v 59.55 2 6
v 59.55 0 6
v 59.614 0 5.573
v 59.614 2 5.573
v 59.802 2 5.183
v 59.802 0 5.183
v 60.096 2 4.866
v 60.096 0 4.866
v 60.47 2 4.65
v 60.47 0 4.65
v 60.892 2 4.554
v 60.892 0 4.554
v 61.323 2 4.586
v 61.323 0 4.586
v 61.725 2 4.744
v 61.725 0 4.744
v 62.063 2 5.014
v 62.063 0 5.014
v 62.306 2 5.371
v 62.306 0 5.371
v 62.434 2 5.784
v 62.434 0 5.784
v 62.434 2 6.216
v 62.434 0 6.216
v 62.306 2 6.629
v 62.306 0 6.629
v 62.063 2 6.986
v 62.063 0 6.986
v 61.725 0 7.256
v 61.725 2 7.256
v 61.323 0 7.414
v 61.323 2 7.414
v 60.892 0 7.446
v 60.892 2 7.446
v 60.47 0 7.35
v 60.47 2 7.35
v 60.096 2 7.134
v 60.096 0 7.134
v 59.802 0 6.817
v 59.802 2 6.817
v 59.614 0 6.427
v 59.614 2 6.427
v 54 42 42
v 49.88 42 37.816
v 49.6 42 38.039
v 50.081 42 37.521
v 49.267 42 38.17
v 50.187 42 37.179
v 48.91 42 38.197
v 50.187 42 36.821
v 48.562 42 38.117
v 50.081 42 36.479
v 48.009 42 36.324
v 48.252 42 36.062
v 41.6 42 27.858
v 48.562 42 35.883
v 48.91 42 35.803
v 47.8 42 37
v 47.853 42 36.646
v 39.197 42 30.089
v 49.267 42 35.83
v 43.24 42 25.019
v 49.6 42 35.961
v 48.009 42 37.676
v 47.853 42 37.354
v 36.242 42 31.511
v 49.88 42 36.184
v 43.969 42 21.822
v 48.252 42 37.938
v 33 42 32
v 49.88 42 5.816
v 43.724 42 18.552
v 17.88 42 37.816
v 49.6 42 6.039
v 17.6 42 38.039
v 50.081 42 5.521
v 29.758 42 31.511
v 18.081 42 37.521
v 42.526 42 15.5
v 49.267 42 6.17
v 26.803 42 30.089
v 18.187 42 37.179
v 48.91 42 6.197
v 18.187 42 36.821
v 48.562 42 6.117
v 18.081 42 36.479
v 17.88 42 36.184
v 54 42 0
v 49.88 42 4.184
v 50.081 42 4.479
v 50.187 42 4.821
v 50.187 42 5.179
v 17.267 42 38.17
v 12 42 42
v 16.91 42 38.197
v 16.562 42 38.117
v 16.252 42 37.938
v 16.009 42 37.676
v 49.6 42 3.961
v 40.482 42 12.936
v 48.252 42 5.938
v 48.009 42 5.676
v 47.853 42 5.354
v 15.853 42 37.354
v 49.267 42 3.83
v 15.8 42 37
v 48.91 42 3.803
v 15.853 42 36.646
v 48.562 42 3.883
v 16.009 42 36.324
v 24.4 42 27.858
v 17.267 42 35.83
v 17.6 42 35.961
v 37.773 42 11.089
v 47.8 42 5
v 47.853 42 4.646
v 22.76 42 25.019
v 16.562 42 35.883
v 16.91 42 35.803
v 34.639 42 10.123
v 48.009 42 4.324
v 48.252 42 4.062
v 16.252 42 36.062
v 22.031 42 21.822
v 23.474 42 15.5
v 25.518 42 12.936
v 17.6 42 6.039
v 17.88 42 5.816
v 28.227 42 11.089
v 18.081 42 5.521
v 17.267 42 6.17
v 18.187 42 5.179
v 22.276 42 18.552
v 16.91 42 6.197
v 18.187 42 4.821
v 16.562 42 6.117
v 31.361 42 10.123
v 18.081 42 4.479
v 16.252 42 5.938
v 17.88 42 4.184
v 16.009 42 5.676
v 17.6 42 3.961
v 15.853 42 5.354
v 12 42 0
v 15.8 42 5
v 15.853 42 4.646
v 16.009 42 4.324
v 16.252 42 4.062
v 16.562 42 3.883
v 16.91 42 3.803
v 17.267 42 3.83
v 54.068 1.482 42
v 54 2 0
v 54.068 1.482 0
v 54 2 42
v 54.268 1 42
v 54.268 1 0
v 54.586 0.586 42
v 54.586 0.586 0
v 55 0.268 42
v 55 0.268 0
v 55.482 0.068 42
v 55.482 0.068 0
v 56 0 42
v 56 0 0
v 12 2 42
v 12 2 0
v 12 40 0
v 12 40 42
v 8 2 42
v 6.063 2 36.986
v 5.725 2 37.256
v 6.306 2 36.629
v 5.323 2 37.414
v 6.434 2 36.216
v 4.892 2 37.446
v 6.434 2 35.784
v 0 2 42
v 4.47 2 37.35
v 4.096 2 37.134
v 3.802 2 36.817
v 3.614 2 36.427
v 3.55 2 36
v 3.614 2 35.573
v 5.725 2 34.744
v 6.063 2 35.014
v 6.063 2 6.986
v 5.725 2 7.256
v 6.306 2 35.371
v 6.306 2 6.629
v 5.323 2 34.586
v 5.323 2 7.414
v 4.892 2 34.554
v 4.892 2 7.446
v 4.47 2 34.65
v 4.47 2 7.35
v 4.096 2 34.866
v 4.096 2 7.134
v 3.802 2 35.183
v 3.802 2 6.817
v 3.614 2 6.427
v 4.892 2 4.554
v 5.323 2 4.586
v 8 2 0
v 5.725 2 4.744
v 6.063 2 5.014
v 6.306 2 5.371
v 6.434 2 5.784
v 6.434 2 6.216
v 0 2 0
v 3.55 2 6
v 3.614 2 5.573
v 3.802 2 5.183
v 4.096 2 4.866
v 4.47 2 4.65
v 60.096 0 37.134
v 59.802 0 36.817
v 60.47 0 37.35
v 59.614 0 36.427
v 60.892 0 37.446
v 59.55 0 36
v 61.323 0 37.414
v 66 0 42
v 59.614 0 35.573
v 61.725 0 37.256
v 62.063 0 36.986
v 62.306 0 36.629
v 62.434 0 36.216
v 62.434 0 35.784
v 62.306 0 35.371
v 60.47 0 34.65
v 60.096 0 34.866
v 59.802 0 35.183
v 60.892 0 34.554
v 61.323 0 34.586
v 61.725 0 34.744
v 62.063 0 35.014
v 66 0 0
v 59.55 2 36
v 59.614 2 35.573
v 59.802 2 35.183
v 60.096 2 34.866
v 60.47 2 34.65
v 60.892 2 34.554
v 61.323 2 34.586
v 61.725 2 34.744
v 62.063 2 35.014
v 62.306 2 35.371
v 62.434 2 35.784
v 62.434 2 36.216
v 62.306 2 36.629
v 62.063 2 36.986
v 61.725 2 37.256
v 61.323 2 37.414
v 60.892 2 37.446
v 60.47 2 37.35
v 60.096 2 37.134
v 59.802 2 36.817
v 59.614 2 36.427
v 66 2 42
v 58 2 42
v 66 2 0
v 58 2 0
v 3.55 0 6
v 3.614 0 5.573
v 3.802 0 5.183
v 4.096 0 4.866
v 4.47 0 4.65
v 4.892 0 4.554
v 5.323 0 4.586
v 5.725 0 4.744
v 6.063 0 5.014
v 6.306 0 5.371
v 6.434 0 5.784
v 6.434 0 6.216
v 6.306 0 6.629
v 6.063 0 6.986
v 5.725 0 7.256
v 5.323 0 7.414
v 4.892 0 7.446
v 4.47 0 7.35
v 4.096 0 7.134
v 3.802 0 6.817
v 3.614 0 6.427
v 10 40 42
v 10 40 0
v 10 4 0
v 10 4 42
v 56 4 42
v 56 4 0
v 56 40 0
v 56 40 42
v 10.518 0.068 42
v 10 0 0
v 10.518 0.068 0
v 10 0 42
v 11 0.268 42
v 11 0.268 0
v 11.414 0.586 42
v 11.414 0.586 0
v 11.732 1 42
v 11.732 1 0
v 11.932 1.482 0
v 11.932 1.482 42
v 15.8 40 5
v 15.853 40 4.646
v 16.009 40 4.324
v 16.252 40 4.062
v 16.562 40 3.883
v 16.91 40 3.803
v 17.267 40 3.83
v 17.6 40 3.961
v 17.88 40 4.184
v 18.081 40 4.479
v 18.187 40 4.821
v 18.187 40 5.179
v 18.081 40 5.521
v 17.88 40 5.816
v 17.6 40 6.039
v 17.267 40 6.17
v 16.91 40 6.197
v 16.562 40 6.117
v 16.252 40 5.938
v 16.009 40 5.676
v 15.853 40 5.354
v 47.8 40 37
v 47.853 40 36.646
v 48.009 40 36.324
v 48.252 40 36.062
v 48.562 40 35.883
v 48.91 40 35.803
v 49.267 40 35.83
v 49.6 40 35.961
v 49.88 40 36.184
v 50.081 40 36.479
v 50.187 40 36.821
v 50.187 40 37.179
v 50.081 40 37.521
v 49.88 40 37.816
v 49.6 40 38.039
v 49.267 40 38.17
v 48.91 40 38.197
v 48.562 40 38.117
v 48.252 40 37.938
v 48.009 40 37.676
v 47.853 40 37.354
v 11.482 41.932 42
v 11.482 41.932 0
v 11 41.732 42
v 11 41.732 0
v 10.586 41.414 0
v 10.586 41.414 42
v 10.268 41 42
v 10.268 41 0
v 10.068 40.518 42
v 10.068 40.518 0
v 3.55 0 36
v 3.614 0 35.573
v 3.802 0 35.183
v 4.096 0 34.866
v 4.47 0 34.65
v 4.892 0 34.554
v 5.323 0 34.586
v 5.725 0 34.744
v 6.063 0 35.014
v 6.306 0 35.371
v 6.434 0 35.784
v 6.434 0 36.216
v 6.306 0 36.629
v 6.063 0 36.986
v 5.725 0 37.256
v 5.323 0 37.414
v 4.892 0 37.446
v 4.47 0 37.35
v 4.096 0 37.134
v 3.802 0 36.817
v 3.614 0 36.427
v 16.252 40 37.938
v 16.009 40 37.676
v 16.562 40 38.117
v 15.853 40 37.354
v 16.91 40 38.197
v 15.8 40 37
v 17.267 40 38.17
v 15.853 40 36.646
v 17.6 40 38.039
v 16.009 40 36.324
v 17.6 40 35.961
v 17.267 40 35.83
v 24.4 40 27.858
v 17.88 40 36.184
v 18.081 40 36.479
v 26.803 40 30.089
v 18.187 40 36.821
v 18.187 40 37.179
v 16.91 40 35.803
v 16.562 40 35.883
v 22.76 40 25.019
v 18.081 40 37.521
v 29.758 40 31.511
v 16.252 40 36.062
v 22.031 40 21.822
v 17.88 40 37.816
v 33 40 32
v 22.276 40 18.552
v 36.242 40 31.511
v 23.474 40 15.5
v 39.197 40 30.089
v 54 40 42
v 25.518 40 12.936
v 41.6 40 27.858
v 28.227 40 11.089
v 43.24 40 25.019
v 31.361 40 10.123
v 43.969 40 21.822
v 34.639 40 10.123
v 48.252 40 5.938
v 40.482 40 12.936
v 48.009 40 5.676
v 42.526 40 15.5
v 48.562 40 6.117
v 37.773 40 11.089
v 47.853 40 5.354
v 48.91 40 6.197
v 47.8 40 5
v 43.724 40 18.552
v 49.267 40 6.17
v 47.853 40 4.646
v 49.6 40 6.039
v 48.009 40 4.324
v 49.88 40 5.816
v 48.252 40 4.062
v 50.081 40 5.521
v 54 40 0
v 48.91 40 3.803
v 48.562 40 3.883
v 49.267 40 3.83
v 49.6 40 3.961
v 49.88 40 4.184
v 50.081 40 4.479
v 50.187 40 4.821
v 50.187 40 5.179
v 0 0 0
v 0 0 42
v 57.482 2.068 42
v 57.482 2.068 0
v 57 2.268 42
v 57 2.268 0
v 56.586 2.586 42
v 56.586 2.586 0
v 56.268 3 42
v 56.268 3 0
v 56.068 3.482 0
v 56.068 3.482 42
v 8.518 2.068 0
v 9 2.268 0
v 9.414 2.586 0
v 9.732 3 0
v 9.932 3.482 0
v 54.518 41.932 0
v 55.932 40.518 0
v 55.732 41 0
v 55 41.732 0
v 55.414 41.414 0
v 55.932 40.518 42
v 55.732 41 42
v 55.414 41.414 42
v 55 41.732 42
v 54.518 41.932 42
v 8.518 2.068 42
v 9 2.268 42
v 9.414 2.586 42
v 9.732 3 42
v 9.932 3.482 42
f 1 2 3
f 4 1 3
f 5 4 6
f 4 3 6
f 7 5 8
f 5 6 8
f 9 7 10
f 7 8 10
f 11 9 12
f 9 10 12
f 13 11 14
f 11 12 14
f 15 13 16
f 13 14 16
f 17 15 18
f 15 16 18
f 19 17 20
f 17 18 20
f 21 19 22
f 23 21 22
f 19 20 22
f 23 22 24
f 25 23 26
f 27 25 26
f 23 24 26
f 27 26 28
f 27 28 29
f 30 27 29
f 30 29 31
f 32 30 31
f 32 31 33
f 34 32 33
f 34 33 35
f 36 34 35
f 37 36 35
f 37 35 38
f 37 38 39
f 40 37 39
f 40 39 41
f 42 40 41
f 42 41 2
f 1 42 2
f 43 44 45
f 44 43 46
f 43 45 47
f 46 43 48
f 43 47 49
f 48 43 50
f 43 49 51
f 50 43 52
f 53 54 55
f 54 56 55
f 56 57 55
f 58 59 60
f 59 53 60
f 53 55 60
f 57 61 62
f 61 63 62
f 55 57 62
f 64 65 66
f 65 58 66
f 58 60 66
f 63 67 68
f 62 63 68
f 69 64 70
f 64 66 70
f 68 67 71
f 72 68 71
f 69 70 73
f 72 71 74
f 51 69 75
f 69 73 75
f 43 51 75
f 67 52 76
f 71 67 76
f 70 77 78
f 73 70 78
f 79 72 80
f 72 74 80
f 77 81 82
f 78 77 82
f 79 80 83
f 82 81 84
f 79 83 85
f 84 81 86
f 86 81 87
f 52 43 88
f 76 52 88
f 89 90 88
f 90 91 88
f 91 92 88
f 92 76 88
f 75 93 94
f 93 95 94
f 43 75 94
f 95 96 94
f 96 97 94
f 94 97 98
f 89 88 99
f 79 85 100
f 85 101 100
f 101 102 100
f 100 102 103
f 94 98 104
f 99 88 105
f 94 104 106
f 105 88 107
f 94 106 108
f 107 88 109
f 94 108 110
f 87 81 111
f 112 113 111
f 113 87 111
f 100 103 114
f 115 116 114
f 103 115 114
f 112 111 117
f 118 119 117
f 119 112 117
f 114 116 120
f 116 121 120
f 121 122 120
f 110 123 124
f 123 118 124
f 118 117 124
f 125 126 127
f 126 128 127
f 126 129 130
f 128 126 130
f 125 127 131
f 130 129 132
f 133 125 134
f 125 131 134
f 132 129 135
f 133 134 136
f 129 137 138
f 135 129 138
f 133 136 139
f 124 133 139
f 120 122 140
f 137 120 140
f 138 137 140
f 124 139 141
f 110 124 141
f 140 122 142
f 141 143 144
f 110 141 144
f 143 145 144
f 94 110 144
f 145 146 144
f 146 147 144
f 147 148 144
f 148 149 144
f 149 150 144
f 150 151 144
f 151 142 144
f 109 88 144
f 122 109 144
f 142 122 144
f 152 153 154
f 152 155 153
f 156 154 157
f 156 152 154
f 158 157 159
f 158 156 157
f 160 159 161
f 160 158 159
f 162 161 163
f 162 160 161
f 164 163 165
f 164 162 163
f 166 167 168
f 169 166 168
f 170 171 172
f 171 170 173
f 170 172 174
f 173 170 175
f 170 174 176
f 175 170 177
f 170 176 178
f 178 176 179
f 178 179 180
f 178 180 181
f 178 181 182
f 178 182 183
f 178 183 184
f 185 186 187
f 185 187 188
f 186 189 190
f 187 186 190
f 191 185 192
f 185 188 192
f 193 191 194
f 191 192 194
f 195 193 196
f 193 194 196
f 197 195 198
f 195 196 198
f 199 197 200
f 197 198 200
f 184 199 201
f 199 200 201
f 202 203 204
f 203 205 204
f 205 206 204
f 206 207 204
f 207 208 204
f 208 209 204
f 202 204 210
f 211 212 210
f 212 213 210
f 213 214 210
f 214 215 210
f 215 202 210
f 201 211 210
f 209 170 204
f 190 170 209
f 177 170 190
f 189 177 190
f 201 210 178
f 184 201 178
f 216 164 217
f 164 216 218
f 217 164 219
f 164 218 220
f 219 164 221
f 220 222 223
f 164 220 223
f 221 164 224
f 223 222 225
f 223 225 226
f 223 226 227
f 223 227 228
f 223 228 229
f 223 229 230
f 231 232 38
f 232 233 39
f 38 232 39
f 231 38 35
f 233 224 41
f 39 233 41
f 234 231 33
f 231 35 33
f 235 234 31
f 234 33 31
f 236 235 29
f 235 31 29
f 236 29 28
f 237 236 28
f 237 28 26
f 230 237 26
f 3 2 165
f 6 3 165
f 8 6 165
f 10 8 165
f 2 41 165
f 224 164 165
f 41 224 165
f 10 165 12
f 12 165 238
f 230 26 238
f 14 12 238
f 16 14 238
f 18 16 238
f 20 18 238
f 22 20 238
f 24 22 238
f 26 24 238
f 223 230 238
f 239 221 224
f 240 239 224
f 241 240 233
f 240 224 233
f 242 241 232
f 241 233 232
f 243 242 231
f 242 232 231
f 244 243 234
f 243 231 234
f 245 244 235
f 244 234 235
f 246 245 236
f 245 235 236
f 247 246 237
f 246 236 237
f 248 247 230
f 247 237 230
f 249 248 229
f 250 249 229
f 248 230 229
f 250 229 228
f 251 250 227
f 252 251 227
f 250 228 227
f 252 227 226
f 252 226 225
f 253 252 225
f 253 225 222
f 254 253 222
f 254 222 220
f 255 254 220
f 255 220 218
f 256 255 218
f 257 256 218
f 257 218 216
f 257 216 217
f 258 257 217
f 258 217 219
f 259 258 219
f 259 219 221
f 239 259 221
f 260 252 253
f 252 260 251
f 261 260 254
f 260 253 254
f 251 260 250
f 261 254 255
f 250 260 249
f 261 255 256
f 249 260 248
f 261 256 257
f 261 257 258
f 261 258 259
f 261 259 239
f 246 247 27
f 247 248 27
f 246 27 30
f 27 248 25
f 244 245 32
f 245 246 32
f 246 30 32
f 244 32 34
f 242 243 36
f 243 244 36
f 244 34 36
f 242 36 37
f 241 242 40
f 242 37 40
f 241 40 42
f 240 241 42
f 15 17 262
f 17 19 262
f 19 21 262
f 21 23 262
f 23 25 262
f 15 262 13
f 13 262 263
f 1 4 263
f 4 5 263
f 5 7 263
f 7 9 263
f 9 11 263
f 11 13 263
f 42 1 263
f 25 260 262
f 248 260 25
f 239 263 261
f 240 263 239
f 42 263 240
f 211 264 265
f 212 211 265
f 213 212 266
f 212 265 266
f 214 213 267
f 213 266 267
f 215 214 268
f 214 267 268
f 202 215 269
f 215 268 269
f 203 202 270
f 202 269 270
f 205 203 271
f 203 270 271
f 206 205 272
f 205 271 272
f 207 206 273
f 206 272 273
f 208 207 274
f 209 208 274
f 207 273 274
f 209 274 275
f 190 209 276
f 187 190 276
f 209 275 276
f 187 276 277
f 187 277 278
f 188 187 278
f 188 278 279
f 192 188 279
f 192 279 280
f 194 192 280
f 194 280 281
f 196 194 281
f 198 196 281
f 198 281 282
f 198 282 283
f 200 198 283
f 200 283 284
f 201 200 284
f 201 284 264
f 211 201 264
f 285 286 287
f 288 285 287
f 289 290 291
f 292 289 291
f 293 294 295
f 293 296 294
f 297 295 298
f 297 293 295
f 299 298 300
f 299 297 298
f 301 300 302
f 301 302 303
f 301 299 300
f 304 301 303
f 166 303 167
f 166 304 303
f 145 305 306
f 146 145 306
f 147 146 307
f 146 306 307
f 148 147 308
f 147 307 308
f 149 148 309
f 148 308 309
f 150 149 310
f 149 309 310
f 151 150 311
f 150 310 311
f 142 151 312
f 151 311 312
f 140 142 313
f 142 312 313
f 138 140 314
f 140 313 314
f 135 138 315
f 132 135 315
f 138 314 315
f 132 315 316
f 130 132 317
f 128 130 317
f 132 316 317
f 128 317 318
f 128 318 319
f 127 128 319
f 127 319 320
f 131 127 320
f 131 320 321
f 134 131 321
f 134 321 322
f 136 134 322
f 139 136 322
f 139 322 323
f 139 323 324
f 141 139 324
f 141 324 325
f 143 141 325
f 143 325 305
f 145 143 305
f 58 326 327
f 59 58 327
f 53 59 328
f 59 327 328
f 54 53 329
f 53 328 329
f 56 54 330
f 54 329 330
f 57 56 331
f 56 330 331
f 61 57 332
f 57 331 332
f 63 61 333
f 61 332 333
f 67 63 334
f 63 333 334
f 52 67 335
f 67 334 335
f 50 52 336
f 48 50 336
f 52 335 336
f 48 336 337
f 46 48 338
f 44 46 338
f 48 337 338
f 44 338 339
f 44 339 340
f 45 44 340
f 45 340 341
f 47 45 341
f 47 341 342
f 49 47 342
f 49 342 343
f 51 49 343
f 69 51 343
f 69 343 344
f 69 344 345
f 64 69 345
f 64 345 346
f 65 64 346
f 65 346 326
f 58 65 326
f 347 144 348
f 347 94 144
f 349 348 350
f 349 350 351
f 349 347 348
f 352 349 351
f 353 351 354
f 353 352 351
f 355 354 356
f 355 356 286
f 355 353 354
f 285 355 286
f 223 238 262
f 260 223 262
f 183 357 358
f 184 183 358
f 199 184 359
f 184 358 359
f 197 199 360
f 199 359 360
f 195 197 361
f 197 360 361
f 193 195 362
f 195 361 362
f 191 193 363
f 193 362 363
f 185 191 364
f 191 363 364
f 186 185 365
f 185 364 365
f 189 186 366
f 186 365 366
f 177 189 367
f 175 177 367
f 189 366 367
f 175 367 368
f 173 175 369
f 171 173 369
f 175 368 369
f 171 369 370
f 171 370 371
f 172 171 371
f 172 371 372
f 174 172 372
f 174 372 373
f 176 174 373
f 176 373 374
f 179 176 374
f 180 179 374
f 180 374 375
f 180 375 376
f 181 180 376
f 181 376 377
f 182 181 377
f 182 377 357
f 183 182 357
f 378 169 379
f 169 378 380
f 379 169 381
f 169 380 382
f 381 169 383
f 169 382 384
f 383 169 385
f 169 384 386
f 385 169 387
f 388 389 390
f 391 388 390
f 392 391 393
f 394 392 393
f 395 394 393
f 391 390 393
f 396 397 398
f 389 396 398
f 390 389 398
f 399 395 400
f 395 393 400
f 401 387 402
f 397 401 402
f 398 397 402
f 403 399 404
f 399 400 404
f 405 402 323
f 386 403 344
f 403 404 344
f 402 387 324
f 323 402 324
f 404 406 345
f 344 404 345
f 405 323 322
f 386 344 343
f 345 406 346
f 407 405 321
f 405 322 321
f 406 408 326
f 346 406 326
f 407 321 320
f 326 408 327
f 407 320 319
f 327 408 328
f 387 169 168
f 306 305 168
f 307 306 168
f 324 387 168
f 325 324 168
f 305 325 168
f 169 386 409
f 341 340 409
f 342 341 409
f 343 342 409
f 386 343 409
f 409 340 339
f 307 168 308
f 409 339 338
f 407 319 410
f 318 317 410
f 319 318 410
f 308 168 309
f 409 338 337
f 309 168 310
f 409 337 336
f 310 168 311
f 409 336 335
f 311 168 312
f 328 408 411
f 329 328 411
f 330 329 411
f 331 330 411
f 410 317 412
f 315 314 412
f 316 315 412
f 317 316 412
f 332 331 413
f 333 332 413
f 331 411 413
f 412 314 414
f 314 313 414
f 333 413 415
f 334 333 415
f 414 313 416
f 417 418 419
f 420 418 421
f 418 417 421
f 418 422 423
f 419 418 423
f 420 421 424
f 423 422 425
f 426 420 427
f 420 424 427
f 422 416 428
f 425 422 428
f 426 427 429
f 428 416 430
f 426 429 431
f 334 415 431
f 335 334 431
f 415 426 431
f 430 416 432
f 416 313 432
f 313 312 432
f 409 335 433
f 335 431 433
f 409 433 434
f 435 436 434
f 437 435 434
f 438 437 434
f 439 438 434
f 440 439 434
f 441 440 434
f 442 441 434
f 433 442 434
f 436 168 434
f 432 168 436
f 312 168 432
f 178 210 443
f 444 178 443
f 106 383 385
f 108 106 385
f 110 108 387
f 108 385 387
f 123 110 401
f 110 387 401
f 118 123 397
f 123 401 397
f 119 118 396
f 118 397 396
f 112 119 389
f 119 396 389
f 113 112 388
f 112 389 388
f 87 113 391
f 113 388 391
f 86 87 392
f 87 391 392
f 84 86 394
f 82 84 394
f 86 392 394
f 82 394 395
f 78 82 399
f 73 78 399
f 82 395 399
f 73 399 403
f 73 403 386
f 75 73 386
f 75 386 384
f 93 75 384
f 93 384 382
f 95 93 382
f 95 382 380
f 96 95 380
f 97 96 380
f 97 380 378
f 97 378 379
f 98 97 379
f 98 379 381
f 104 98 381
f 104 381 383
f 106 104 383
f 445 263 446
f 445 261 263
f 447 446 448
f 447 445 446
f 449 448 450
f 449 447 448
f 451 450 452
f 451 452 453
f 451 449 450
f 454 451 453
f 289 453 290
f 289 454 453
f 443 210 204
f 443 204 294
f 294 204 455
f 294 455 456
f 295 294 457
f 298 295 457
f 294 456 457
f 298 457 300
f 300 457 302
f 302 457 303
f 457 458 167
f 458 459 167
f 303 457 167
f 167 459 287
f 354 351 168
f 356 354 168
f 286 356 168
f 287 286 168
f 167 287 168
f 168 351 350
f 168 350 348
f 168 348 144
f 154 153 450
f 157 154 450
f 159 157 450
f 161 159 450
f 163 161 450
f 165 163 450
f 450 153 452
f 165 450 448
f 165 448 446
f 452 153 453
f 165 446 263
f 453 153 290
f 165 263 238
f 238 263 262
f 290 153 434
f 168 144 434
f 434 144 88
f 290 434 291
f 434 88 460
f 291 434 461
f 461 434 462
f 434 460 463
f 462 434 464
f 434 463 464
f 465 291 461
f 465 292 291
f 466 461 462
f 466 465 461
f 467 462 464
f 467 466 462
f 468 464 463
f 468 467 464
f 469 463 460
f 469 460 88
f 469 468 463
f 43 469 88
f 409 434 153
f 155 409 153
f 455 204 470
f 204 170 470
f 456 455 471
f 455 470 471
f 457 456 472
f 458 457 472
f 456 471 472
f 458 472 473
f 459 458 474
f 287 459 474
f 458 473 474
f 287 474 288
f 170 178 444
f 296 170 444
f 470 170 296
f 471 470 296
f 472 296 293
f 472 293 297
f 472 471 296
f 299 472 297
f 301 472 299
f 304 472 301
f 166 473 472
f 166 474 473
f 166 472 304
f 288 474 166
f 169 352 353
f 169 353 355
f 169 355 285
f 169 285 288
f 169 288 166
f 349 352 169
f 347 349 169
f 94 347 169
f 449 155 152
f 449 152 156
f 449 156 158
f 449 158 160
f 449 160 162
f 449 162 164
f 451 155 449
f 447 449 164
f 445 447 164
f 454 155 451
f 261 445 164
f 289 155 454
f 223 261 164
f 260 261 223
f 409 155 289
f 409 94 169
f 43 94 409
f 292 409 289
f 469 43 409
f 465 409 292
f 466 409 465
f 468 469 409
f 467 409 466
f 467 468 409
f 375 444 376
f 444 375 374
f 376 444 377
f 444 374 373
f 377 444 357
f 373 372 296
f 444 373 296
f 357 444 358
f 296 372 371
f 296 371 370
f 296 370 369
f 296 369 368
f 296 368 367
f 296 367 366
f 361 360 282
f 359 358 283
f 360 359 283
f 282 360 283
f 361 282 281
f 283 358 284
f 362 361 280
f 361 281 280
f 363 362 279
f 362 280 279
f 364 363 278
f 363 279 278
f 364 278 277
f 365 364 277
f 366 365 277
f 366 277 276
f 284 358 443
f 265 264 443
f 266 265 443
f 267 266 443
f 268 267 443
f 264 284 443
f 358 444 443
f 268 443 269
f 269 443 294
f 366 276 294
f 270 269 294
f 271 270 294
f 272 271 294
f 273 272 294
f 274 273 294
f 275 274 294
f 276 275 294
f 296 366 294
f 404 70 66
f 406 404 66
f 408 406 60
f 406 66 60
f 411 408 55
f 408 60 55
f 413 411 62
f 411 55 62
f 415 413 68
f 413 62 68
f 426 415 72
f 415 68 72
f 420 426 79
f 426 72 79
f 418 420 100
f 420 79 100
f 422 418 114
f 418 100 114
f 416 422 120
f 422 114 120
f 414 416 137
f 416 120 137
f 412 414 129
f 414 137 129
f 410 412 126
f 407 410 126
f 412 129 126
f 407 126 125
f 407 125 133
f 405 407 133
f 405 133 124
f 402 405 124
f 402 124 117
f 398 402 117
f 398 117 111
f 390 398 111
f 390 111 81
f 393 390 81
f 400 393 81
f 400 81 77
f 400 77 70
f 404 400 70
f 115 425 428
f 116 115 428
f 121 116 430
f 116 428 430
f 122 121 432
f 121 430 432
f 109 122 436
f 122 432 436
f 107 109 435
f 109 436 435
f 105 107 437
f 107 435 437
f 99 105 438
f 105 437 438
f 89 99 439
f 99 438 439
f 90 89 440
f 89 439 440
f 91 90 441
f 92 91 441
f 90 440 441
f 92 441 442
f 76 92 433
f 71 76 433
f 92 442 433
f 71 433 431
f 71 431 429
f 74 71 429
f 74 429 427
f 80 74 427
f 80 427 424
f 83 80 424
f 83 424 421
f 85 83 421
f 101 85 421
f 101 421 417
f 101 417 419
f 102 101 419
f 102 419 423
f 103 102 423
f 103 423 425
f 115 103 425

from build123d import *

# Parameters (mm, degrees)
BOSS_EXTRU_1_DEPTH      = 42
D_GAGEMENT_M2_51_D      = 2.9
D_GAGEMENT_M21_D        = 2.4
ENL_V_MAT_EXTRU_1_REACH = 90.792
ESQUISSE6_R             = 11
CONG_1_R                = 2


with BuildPart() as part:
    # Esquisse1 → Boss.-Extru.1 (new body)
    with BuildSketch(Plane.XY):
        Polygon((0, 0), (12, 0), (12, 40), (54, 40), (54, 0), (66, 0), (66, 2), (56, 2), (56, 42), (10, 42), (10, 2), (0, 2), align=None)
    extrude(amount=BOSS_EXTRU_1_DEPTH)

    # Dégagement M2.51 (through all)
    with Locations(Plane(origin=(0, 2, 0), x_dir=(1, 0, 0), z_dir=(0, 1, 0))):
        with Locations((5, -6), (5, -36), (61, -6), (61, -36)):
            Hole(D_GAGEMENT_M2_51_D / 2)

    # Dégagement M21 (through all)
    with Locations(Plane(origin=(0, 42, 0), x_dir=(1, 0, 0), z_dir=(0, 1, 0))):
        with Locations((17, -5), (49, -37), (17, -37), (49, -5)):
            Hole(D_GAGEMENT_M21_D / 2)

    # Esquisse6 → Enlèv. mat.-Extru.1 (cut, up to next)
    with BuildSketch(Plane(origin=(0, 42, 0), x_dir=(1, 0, 0), z_dir=(0, 1, 0)), mode=Mode.PRIVATE) as enl_v_mat_extru_1_sk1:
        with Locations(Location((33, -21, 0), (0, 0, 270))):
            Circle(ESQUISSE6_R)
    enl_v_mat_extru_1_tool1 = extrude(enl_v_mat_extru_1_sk1.sketch, amount=-ENL_V_MAT_EXTRU_1_REACH, mode=Mode.PRIVATE) & part.part
    add(enl_v_mat_extru_1_tool1.solids().sort_by_distance((33, 42, 21))[0], mode=Mode.SUBTRACT)

    # Congé1
    cong_1_edges = [part.edges().sort_by_distance(p)[0] for p in [
        (10, 2, 21),
        (10, 42, 21),
        (56, 42, 21),
        (56, 2, 21),
        (54, 0, 21),
        (12, 0, 21),
    ]]
    fillet(cong_1_edges, radius=CONG_1_R)


solid = part.part
